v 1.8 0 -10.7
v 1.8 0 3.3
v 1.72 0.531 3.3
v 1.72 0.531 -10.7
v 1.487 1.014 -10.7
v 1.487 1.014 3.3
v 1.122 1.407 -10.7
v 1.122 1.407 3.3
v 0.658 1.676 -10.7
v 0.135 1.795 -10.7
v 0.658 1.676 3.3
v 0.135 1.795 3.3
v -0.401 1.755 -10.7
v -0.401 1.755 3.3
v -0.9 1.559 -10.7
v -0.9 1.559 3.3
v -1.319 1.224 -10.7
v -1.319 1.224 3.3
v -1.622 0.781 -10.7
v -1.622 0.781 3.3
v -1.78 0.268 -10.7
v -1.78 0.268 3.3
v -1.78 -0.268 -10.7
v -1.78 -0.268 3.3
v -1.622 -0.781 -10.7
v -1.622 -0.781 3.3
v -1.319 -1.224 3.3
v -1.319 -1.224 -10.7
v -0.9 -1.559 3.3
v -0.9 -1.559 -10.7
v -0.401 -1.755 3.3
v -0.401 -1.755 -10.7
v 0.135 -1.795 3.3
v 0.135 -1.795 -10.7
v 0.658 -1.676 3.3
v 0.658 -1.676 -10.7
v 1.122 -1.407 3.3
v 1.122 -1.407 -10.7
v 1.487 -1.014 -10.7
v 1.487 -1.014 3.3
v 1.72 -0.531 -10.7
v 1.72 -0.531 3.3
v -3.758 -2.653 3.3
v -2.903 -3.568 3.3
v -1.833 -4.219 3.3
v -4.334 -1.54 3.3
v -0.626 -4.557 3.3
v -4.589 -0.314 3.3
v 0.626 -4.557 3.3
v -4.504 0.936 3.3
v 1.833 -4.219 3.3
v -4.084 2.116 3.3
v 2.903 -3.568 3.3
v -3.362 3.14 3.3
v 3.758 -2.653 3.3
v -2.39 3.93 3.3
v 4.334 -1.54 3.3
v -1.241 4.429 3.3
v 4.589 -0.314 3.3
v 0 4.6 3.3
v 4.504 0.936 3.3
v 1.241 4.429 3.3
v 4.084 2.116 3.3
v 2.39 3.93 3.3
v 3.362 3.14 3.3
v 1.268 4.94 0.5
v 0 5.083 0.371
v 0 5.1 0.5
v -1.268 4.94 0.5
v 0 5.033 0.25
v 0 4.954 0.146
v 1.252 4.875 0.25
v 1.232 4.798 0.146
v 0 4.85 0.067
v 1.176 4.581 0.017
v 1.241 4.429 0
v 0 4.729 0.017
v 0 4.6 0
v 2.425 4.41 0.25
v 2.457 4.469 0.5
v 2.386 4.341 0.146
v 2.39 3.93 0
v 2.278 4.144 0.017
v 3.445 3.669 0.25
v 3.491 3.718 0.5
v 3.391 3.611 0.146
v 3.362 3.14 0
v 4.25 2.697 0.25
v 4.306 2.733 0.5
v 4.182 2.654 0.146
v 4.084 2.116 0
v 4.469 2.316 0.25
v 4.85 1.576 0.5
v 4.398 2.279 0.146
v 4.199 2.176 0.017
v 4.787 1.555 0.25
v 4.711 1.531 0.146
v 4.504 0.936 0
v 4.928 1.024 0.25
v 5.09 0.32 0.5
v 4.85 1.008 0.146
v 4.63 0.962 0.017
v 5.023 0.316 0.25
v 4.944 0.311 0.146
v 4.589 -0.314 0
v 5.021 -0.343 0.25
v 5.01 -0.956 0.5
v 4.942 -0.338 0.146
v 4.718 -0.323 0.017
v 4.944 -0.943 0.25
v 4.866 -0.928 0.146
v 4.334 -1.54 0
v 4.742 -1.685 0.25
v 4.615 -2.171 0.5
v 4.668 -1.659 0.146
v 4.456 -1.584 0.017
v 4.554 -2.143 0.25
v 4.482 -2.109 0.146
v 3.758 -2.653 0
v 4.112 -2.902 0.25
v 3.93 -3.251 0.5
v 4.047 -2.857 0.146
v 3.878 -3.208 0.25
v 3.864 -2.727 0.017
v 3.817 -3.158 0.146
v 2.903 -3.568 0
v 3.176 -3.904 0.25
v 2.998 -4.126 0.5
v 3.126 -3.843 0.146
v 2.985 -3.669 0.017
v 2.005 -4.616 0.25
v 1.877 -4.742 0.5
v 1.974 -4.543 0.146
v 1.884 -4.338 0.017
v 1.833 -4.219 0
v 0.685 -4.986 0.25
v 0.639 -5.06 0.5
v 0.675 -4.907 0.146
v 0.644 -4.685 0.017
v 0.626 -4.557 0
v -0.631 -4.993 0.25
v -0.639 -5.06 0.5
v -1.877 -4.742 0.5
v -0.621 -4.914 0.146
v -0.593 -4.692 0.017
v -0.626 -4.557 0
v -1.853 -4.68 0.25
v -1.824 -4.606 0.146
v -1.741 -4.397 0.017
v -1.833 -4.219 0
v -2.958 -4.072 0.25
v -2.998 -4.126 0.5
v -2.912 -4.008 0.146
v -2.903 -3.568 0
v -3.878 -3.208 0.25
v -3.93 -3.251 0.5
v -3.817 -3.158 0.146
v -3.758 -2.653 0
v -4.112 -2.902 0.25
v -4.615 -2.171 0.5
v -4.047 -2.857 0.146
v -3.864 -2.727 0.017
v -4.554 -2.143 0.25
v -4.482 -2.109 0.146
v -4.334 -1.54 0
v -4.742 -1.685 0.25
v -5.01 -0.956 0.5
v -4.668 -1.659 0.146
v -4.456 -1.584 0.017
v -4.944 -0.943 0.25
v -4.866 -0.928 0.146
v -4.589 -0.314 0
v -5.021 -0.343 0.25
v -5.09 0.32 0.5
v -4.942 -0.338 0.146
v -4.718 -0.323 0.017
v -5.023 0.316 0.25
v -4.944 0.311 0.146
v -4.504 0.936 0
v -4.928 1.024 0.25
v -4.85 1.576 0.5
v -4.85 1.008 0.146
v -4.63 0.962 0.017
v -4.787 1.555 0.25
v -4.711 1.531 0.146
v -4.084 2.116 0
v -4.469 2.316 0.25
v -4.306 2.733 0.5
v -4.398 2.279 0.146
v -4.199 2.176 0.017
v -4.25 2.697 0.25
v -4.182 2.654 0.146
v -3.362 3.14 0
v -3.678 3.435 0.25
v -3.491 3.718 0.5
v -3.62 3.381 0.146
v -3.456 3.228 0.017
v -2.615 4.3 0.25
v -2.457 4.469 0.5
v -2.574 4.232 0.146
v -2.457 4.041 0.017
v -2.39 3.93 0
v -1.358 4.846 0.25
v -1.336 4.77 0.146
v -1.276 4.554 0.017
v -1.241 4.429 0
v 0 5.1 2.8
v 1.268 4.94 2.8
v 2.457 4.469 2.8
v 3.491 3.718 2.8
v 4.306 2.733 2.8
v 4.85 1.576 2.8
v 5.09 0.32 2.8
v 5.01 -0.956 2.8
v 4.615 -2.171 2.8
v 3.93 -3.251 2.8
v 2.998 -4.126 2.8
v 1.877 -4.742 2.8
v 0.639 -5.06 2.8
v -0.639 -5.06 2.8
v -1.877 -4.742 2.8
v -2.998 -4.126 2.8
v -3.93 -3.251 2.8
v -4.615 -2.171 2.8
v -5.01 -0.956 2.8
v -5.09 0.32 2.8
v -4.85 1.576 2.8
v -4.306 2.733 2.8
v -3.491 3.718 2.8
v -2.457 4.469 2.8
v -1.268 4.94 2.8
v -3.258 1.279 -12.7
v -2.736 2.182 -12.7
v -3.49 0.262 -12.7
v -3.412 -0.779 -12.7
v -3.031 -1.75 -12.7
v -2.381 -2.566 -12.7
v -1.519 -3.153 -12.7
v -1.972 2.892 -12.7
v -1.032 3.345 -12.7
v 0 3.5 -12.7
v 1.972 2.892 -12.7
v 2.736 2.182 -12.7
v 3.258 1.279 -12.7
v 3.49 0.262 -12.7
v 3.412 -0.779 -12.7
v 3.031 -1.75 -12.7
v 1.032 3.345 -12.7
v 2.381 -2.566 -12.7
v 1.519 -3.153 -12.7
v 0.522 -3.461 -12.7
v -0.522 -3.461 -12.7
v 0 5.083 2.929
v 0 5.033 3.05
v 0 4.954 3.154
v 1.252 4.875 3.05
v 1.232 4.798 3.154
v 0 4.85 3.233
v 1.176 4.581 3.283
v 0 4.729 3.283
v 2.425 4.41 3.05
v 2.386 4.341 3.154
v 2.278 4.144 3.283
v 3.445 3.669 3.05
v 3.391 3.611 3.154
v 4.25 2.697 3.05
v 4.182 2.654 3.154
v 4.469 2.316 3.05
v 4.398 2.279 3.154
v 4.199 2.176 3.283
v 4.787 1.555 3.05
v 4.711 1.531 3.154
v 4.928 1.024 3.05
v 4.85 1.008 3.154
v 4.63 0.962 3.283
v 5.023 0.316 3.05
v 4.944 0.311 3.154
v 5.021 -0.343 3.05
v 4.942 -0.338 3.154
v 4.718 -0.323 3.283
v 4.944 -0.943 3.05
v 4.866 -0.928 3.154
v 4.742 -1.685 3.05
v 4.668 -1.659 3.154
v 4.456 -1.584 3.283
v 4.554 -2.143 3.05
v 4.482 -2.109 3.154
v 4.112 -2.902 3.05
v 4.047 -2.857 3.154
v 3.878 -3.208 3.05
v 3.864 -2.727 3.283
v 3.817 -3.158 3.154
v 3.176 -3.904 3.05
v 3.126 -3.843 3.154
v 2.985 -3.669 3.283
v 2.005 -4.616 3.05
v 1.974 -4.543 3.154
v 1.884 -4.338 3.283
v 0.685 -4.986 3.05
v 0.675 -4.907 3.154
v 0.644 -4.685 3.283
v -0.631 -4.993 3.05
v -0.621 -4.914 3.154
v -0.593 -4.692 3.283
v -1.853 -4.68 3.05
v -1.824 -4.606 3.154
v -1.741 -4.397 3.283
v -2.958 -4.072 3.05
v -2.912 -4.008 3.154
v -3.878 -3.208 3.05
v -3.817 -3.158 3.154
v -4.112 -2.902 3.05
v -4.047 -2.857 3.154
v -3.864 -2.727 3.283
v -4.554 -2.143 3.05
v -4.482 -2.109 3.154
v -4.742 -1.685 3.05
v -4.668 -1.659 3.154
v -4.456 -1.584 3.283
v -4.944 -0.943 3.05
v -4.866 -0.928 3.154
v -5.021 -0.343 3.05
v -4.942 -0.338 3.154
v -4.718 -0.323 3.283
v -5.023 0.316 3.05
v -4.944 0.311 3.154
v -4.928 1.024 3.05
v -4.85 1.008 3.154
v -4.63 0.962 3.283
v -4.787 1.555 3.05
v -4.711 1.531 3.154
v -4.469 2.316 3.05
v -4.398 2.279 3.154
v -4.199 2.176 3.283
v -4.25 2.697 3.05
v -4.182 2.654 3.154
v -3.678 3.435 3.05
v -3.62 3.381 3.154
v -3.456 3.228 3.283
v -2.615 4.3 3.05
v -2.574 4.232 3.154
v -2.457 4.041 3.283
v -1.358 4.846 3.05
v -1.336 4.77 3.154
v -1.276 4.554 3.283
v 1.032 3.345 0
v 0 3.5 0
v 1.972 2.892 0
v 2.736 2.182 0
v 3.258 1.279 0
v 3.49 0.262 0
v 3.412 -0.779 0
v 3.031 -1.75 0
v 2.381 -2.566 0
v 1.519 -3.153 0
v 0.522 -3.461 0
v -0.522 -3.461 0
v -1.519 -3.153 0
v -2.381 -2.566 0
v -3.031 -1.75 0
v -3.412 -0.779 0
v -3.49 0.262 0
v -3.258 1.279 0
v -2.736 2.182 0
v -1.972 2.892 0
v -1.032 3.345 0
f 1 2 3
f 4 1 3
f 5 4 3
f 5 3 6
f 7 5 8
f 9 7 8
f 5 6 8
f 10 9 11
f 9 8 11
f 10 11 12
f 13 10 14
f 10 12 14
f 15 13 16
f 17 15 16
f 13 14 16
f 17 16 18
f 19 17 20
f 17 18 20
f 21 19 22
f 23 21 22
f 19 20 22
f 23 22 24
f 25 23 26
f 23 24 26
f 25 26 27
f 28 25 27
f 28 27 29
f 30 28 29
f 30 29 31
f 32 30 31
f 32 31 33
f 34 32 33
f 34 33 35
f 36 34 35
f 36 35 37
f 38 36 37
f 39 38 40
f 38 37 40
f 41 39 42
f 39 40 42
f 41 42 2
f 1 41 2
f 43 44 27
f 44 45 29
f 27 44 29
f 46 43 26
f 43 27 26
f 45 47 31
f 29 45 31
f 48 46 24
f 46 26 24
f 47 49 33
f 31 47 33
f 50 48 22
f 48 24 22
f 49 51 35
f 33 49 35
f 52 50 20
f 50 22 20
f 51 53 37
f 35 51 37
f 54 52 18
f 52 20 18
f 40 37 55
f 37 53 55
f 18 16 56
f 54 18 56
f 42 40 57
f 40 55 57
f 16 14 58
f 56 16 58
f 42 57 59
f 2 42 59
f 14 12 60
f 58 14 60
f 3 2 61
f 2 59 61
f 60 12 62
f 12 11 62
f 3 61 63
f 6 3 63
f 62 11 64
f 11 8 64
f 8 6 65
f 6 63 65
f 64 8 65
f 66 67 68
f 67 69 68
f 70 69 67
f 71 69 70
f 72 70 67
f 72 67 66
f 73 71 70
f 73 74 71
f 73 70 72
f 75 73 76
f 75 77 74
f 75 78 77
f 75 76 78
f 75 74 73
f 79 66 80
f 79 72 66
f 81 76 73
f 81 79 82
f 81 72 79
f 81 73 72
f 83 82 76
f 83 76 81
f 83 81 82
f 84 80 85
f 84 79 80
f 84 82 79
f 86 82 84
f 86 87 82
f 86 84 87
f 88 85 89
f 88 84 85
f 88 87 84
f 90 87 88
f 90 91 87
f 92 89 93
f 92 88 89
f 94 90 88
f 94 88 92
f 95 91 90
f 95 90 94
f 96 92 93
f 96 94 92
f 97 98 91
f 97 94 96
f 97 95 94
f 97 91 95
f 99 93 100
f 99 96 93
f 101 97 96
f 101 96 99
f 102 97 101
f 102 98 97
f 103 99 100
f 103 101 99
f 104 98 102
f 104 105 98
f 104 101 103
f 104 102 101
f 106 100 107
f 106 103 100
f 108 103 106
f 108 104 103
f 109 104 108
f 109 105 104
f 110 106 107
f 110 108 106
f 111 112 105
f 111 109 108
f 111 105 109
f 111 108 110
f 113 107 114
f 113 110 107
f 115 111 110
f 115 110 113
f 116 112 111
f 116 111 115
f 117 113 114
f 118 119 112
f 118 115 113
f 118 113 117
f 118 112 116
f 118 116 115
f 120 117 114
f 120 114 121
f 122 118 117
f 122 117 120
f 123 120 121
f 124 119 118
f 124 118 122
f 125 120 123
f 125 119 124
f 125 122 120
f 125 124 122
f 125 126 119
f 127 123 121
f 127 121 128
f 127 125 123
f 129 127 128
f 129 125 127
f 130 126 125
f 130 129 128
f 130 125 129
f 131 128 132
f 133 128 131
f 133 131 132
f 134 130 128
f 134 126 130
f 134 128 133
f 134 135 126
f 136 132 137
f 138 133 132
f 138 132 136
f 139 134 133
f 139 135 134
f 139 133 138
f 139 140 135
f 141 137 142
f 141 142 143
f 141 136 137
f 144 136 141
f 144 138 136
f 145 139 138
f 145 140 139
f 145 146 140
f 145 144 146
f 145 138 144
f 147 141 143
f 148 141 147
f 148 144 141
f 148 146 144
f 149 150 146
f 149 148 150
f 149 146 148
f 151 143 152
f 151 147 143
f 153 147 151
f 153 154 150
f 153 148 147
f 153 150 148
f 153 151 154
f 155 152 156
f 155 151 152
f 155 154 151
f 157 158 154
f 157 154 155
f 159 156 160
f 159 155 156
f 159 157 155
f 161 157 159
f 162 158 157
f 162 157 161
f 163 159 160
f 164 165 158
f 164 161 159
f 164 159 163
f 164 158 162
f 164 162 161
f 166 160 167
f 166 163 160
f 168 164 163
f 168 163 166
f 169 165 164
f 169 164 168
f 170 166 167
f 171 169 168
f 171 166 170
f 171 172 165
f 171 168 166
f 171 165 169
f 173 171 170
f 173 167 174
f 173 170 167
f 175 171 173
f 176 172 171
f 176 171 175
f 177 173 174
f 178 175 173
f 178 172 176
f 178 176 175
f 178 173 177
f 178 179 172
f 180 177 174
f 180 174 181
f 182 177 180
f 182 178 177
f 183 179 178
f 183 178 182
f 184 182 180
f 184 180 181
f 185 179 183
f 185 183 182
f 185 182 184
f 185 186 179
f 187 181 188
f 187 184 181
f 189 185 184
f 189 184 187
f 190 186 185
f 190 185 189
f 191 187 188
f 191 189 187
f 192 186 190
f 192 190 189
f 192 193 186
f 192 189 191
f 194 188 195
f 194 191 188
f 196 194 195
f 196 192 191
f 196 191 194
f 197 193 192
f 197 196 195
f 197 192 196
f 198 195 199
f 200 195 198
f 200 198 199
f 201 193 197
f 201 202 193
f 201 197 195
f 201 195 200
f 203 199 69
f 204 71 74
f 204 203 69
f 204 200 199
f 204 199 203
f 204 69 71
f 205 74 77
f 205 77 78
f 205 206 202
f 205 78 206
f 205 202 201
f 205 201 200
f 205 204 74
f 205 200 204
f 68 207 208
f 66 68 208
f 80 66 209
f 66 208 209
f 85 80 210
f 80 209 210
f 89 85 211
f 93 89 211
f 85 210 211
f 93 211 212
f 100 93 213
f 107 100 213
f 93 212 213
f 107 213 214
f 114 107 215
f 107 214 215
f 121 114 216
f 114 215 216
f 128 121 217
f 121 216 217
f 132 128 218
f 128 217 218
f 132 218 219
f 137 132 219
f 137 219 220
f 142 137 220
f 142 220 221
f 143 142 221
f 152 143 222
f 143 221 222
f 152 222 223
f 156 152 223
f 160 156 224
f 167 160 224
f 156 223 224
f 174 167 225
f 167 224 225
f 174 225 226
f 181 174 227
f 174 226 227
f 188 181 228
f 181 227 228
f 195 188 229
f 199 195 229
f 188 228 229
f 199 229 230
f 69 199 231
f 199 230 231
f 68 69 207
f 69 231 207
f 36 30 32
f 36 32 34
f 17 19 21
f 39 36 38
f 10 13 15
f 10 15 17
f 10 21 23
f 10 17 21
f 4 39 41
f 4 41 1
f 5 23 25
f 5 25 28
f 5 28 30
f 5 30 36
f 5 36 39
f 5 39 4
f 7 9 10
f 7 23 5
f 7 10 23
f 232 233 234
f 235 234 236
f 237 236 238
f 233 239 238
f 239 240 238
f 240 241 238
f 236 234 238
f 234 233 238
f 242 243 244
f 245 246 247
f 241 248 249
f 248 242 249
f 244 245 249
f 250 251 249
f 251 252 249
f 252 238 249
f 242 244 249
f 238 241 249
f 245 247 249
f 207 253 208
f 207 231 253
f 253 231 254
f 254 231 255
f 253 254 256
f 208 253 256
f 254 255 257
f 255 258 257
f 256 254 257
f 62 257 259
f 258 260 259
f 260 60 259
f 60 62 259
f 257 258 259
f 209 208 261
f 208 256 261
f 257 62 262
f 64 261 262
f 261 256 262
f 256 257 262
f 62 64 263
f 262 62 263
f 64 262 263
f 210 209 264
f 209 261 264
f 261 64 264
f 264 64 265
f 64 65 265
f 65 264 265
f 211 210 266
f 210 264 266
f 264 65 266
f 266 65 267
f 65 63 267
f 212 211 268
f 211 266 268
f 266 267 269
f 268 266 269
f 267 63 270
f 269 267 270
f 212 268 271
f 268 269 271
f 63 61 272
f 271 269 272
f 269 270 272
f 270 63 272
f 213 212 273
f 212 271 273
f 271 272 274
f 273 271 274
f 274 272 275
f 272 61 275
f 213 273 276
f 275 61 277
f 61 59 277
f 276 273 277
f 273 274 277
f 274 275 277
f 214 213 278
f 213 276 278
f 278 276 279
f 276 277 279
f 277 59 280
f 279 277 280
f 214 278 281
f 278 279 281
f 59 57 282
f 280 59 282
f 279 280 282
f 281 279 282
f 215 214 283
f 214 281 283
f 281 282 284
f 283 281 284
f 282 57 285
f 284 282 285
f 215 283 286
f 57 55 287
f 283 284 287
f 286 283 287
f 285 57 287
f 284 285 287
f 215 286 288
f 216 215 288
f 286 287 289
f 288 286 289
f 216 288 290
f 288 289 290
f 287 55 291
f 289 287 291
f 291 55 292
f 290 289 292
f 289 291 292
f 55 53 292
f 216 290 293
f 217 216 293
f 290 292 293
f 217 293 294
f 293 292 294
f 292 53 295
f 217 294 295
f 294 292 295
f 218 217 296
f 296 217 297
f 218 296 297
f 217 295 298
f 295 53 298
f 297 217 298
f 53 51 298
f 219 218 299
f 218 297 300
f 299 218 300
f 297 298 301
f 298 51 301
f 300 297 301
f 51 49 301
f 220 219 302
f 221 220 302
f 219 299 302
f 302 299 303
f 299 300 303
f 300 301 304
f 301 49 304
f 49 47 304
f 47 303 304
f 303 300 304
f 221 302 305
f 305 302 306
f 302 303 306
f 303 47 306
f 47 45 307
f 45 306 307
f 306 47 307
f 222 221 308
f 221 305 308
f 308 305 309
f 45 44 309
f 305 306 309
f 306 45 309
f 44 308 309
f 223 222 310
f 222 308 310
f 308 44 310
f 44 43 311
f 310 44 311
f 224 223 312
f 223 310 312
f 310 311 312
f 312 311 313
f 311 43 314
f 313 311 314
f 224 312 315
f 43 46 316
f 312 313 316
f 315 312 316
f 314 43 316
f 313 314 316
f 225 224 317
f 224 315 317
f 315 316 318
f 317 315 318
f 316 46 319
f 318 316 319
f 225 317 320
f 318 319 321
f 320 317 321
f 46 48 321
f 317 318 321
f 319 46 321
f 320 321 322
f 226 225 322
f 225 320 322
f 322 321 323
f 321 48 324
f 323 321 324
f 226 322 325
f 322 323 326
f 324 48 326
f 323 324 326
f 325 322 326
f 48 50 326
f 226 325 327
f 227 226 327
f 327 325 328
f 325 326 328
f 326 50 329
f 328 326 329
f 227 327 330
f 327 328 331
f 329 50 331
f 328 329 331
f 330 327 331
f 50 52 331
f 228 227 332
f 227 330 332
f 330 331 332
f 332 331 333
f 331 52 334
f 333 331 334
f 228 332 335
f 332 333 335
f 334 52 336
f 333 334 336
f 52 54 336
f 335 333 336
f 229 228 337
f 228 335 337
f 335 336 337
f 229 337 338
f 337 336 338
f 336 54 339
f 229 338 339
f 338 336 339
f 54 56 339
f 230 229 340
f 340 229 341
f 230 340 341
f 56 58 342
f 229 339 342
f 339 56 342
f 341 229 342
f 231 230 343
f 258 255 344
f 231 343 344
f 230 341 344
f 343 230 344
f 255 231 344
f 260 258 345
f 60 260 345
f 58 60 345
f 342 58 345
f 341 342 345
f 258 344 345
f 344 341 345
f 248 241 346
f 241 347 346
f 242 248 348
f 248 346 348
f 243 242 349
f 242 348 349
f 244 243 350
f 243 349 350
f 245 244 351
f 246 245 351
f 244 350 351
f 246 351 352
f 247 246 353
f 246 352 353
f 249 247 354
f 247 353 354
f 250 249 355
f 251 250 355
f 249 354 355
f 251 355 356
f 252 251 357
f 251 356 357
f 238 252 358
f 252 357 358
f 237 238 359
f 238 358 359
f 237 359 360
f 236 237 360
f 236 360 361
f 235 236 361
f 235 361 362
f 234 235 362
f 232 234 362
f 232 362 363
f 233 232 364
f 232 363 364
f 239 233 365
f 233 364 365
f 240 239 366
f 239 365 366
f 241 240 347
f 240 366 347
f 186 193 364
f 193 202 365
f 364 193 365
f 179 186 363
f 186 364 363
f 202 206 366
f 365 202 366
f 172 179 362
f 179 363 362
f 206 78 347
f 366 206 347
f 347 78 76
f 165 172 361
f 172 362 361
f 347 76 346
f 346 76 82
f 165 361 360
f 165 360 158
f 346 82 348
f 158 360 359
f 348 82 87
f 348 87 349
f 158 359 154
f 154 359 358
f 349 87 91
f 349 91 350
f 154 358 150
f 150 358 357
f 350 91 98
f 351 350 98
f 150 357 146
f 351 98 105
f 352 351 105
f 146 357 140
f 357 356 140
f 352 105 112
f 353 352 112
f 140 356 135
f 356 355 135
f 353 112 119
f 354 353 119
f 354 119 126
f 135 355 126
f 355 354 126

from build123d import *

# Parameters (mm, degrees)
FILLET1_R          = 0.5
SKETCH2_R          = 1.8
CUT_EXTRUDE1_DEPTH = 14


with BuildPart() as part:
    # Sketch1 → Revolve3 (revolve)
    with BuildSketch(Plane(origin=(0, 0, 0), x_dir=(0, 0, -1), z_dir=(1, 0, 0))):
        Polygon((0, 5.1), (-3.3, 5.1), (-3.3, 0), (12.7, 0), (12.7, 3.5), (0, 3.5), align=None)
    revolve(axis=Axis((0, 0, 0), (0, 0, -1)))

    # Fillet1
    fillet1_edges = [part.edges().sort_by_distance(p)[0] for p in [
        (0, -5.1, 3.3),
        (0, -5.1, 0),
    ]]
    fillet(fillet1_edges, radius=FILLET1_R)

    # Sketch2 → Cut-Extrude1 (cut)
    with BuildSketch(Plane.XY.offset(3.3)):
        Circle(SKETCH2_R)
    extrude(amount=-CUT_EXTRUDE1_DEPTH, mode=Mode.SUBTRACT)


solid = part.part
